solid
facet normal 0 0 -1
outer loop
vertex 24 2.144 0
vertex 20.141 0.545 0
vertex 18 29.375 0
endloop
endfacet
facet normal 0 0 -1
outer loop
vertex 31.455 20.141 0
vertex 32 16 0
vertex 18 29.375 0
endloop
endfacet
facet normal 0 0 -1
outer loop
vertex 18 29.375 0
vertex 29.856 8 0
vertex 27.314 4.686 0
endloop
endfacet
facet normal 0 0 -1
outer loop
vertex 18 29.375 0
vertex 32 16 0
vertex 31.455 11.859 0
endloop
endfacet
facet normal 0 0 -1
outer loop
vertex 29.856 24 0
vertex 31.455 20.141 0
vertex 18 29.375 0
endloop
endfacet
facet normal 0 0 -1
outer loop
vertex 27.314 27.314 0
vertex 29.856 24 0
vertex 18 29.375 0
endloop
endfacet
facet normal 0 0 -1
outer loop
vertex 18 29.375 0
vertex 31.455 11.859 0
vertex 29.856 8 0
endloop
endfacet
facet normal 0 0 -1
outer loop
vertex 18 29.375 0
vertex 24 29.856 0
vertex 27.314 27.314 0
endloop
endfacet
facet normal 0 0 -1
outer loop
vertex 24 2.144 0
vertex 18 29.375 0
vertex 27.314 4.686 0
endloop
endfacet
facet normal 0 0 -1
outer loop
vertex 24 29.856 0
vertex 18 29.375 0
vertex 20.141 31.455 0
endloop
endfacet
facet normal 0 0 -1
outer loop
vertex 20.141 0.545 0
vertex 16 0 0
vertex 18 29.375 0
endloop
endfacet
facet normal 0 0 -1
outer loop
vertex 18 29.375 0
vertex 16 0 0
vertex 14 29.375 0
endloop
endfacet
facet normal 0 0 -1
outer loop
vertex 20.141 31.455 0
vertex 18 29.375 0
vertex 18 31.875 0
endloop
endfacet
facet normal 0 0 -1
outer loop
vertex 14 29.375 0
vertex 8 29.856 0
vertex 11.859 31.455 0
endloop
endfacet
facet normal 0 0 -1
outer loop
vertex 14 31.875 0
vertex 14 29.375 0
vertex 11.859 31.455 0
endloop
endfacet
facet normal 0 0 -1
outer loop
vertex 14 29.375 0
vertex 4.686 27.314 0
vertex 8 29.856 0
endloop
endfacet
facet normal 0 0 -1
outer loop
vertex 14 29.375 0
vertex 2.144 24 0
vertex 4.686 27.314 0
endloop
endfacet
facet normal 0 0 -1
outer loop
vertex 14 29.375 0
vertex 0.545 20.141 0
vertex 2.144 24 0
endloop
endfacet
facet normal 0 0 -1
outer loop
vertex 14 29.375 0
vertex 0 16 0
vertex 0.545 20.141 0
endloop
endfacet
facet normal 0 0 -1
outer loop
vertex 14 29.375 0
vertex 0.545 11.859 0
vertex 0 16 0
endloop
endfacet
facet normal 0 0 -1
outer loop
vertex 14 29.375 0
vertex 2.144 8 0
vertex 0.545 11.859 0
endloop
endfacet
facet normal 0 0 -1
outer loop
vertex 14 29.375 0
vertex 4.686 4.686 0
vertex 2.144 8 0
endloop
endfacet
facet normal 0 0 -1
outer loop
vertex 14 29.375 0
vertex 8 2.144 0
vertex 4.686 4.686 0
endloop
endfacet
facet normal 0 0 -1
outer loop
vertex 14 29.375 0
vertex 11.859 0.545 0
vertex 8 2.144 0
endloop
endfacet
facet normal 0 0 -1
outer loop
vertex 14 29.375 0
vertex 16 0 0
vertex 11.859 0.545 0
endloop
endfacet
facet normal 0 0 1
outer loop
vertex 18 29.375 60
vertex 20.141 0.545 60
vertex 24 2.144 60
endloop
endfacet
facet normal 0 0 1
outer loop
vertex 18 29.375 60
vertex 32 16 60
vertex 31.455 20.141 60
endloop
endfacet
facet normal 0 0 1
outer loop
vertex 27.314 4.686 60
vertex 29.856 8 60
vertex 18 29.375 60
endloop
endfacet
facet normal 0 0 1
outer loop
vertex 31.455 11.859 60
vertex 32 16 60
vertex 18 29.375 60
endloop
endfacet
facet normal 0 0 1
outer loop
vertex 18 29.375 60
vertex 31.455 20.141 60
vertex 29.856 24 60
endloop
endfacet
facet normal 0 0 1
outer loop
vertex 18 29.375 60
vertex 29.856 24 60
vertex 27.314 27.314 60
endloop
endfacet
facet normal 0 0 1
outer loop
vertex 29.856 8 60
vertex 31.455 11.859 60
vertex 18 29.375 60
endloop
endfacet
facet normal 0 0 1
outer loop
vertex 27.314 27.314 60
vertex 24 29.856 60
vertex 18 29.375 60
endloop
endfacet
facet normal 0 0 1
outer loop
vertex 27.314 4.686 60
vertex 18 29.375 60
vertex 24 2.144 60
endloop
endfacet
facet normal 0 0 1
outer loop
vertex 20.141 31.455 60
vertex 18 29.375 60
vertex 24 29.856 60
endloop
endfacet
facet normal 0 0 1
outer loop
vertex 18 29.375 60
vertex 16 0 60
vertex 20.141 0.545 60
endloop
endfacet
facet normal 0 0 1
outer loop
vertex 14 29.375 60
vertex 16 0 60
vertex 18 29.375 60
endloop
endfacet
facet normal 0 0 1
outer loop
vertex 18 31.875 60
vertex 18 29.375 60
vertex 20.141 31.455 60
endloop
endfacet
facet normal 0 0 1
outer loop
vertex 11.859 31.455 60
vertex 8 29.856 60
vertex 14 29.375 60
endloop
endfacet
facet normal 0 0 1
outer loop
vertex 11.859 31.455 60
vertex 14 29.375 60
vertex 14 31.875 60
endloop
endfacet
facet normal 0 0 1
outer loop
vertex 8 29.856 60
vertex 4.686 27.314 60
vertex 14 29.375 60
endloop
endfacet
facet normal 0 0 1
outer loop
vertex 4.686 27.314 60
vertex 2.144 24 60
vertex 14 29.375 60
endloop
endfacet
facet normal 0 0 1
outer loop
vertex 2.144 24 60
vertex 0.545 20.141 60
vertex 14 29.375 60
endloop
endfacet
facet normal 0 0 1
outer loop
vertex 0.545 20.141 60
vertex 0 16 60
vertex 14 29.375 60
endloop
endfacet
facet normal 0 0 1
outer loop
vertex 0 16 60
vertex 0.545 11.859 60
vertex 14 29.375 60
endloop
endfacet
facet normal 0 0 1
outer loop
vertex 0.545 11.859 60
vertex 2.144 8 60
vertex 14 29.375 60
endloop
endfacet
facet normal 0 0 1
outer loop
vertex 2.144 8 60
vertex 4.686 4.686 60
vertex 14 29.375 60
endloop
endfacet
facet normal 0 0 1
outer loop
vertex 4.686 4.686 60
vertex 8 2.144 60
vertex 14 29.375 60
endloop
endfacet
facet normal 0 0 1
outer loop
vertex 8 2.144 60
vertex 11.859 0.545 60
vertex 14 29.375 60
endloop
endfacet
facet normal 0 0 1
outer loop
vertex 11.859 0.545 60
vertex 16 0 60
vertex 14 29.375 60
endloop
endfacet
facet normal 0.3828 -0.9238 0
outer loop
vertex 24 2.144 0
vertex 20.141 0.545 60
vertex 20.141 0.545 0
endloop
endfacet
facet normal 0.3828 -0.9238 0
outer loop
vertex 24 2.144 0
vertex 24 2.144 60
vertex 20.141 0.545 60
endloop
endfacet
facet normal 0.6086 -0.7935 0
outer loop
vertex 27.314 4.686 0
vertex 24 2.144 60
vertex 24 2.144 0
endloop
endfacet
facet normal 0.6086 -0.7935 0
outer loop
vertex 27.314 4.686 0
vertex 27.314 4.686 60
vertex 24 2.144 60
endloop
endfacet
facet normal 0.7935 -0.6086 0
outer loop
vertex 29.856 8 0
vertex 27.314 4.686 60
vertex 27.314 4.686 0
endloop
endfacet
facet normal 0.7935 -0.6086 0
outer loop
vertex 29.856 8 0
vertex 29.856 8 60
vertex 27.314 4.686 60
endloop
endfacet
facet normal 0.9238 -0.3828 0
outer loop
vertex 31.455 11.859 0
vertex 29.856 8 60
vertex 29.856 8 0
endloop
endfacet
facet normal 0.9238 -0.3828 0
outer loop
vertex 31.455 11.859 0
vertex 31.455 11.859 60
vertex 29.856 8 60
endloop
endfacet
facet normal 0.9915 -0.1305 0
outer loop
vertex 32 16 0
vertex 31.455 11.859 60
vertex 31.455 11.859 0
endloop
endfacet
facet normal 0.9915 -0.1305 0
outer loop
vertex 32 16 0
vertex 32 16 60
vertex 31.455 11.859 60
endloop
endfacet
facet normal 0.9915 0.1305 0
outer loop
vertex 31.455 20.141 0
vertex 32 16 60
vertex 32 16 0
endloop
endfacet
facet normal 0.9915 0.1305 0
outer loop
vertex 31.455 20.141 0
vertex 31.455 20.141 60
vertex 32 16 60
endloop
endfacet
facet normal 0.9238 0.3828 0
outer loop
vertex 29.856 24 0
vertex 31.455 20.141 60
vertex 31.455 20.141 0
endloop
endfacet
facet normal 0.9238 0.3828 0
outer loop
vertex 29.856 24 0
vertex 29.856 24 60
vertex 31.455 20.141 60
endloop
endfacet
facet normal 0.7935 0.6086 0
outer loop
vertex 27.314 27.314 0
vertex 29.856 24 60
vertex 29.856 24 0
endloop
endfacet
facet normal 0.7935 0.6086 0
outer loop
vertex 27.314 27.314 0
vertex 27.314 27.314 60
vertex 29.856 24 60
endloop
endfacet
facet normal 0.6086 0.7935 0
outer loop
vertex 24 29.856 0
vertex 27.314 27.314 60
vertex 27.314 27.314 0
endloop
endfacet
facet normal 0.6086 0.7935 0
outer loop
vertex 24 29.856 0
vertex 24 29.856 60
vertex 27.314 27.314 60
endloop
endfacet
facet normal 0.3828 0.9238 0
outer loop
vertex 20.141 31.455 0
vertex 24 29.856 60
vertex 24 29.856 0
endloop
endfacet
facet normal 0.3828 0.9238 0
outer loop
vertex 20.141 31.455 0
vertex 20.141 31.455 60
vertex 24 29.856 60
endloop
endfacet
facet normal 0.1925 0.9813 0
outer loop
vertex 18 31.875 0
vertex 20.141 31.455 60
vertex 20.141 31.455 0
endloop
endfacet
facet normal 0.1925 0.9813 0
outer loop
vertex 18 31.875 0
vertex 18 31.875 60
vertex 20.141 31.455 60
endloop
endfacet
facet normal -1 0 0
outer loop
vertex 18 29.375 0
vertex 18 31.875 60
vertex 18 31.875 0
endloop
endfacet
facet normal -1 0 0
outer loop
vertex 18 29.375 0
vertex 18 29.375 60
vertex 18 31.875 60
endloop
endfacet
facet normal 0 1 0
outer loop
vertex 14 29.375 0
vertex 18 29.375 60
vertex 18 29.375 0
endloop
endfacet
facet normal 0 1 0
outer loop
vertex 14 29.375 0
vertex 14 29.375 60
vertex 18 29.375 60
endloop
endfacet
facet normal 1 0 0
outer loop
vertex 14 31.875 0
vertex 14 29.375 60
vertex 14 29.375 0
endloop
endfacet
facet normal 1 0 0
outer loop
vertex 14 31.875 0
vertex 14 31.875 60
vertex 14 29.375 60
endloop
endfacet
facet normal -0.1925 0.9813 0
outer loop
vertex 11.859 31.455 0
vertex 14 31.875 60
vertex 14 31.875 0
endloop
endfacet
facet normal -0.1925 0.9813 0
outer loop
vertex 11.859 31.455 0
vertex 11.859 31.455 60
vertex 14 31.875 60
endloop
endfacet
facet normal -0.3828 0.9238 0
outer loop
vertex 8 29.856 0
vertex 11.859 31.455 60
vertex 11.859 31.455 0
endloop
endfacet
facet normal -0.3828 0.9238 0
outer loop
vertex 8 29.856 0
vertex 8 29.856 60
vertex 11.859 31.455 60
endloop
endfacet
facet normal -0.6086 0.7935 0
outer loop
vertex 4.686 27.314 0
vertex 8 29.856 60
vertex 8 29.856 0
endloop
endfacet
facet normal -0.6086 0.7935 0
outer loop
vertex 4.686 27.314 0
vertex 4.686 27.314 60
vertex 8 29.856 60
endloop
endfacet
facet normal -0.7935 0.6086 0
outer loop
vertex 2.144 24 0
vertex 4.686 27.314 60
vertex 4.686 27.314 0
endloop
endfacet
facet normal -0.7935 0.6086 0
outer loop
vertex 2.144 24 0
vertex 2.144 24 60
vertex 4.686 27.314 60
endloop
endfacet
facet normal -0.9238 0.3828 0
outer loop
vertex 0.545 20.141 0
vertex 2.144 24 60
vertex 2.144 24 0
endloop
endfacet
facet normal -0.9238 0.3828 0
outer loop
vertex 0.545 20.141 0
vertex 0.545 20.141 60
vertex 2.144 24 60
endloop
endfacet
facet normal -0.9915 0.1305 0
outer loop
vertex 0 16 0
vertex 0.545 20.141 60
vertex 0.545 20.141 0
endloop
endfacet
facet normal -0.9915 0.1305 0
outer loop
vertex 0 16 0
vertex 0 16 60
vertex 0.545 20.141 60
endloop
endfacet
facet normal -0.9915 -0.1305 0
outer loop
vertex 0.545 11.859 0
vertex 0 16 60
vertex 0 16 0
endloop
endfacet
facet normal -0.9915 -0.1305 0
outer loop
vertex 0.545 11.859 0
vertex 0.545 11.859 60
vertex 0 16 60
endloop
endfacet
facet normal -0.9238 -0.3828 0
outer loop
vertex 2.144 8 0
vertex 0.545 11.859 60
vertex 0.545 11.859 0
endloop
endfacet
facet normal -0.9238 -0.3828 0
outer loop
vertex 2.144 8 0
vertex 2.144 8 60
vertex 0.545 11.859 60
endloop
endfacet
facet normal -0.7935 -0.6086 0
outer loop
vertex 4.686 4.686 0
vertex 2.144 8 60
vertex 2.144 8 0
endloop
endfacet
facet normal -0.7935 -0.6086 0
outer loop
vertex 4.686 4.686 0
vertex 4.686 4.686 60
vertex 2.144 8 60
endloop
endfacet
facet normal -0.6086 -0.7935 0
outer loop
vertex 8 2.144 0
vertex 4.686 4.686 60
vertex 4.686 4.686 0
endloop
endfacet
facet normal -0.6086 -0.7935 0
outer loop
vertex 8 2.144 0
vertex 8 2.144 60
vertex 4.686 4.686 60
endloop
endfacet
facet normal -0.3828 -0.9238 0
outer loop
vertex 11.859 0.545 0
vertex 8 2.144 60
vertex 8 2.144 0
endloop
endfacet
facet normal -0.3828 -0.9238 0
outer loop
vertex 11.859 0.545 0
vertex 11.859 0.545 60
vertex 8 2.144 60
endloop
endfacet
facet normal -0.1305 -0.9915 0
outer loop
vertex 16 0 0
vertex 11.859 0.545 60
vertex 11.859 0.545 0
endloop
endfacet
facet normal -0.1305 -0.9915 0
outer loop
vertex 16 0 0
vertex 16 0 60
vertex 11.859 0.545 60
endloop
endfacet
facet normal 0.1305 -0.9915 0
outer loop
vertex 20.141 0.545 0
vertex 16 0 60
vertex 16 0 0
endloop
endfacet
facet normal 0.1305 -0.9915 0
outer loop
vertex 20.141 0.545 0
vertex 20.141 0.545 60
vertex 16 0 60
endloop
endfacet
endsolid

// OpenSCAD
$fn = 32;

// ----------------------------------------------------------------------
// Keyway shaft: d32 shaft, key 4 x 2.5 mm
// ----------------------------------------------------------------------

// --- parameters (mm) ---
shaft_r = 16;             // shaft radius
key_w = 4;                // keyway width
key_d = 2.5;              // keyway depth below the surface line
plate_t = 60;             // shaft length, Z (extrusion height)

shaft_d = 2 * shaft_r;  // shaft diameter
circle_step = 15;  // polygon sampling step, degrees

profile = [[11.859, 31.455], [8, 29.856], [4.686, 27.314], [2.144, 24], [0.545, 20.141], [0, 16], [0.545, 11.859], [2.144, 8], [4.686, 4.686], [8, 2.144], [11.859, 0.545], [16, 0], [20.141, 0.545], [24, 2.144], [27.314, 4.686], [29.856, 8], [31.455, 11.859], [32, 16], [31.455, 20.141], [29.856, 24], [27.314, 27.314], [24, 29.856], [20.141, 31.455], [18, 31.875], [18, 29.375], [14, 29.375], [14, 31.875]];  // primary outline, 27 points, counter clockwise

// --- the one profile operation ---
linear_extrude(height = plate_t) polygon(points = profile);
